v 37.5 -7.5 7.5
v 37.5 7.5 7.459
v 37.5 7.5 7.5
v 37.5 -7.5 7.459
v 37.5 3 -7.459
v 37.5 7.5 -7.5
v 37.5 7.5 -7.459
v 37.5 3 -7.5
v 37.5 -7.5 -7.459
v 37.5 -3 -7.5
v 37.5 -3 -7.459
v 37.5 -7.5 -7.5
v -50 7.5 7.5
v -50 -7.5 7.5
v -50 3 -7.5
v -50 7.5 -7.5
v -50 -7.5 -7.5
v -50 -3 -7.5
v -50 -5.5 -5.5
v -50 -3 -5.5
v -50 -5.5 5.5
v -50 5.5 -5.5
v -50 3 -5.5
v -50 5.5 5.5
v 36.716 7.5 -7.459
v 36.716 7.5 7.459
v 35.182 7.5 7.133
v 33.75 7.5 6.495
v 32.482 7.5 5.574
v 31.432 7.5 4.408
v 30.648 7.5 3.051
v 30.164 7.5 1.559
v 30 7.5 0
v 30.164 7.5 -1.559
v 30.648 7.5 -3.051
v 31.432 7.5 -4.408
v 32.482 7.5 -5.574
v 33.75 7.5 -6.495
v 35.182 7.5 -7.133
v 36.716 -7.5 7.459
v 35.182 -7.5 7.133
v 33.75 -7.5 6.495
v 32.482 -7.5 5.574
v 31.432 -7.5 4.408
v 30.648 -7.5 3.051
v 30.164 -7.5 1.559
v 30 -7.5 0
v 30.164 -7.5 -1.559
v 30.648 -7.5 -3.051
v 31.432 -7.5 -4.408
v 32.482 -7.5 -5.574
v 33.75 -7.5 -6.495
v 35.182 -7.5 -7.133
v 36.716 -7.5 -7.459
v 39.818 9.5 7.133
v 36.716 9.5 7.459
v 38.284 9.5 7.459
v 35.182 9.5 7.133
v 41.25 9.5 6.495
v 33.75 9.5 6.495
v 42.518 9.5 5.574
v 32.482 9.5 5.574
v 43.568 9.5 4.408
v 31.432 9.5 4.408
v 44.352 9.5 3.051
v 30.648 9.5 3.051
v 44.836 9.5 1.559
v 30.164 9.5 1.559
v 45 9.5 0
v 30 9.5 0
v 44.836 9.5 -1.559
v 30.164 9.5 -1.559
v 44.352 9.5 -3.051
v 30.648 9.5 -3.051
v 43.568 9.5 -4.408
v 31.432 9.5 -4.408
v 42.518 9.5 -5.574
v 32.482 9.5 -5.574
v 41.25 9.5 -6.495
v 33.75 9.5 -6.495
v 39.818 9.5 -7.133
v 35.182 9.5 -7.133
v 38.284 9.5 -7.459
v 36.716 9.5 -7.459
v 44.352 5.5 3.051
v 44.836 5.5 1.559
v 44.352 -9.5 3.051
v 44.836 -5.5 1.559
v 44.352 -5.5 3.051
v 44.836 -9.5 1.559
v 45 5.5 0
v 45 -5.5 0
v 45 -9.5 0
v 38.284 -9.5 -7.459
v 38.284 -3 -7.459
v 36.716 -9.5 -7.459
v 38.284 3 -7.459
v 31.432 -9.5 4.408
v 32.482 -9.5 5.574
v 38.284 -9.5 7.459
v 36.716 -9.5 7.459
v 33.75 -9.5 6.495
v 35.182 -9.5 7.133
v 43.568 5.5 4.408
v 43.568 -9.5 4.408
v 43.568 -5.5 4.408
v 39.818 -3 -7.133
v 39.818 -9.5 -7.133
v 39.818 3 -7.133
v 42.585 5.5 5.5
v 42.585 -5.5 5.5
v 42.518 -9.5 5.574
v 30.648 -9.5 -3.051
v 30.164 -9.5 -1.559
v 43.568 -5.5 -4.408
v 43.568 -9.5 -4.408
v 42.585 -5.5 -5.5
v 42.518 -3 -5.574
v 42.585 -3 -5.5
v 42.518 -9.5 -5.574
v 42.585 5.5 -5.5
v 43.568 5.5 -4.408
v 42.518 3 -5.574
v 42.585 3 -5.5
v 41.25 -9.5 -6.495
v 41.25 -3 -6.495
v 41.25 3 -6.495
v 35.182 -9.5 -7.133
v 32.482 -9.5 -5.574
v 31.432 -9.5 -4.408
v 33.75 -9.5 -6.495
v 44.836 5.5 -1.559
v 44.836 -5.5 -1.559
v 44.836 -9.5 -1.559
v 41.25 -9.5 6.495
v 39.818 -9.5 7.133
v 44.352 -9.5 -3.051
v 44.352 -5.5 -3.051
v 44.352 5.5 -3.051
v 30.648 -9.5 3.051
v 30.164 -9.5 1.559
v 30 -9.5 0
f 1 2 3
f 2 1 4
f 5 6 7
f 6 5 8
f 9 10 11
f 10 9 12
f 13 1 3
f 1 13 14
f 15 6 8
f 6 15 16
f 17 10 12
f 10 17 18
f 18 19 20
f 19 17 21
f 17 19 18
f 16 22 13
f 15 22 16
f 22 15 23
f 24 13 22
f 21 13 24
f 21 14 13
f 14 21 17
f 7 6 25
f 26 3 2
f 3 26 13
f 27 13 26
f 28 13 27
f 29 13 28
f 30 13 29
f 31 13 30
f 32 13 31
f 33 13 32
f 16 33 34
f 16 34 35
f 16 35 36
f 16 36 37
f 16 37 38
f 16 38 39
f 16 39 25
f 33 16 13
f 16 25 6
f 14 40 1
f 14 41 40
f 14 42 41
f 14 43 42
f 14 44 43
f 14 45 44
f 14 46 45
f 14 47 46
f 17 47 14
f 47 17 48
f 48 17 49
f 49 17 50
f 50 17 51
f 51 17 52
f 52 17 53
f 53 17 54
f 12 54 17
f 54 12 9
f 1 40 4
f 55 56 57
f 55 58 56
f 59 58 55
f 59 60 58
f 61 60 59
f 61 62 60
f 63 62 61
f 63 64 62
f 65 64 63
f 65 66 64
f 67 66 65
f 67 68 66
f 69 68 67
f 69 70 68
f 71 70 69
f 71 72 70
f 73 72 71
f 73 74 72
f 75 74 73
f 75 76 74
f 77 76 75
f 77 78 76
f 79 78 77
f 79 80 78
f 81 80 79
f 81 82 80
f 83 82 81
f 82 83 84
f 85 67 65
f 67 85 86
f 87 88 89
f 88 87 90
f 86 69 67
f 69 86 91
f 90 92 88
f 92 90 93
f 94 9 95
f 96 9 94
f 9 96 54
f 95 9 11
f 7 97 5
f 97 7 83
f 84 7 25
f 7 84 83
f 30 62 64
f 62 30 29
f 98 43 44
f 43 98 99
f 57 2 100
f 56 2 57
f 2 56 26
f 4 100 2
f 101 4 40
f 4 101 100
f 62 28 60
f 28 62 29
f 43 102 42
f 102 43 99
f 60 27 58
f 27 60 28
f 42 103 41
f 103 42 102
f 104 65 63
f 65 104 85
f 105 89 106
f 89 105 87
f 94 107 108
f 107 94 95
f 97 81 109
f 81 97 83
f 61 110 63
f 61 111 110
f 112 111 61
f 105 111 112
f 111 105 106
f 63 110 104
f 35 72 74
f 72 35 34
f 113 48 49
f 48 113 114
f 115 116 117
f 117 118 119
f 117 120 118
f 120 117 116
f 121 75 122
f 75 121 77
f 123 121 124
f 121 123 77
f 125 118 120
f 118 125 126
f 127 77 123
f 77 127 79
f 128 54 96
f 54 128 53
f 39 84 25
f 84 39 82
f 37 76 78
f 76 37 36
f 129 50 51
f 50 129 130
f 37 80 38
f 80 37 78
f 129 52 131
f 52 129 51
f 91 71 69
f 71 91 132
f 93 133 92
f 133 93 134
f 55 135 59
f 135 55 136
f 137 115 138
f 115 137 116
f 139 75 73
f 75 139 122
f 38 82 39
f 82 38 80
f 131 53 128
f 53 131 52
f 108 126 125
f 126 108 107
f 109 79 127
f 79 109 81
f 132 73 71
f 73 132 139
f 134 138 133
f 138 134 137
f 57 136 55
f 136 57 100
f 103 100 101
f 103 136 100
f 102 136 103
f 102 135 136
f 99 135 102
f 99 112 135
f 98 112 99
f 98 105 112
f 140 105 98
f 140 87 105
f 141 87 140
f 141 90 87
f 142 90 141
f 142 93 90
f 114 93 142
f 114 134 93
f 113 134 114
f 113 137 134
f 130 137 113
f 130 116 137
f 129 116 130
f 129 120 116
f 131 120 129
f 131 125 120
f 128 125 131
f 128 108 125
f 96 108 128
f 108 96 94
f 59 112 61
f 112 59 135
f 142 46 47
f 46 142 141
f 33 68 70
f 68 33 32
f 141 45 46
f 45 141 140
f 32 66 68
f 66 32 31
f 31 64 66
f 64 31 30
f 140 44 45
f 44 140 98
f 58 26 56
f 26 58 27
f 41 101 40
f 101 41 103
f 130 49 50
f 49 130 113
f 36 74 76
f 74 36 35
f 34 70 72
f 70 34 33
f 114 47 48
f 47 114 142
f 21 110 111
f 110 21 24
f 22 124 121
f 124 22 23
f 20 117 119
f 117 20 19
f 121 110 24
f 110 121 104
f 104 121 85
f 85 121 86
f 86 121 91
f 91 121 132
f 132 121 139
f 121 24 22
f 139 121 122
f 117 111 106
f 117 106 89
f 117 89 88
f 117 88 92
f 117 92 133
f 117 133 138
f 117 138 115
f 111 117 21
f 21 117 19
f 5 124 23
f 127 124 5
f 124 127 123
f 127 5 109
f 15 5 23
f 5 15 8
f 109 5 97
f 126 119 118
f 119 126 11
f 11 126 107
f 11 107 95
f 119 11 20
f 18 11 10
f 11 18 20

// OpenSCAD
$fn=30;
module bar1(){
    difference(){
        union(){
            translate([-15/4-5/2,0,0])
            cube([100-15/2-5,15,15], center=true);
            translate([100/2-15/2-5,0,0])
            rotate([90,0,0])
            cylinder(r=15/2, h=19, center=true);
        }
        length=101;
        //length=100-0.3;
        cube([length,10+1,10+1], center=true);
        translate([0,0,-5])
        cube([length,5+1,20], center=true);
    }
}
module bar2(){
    length=100/sqrt(3);
    cube([length,3,10], center=true);
    translate([length/2,0,0])
    rotate([90,0,0])
    cylinder(r=10/2, h=10, center=true);
    
    translate([-length/2,0,0])
    rotate([90,0,0])
    cylinder(r=10/2, h=3, center=true);
}

module base(){
    translate([-100/2-26/2,0,0])
    cube([26,60,2], center=true);
    
    translate([-100/2-5/2,-3/2+15,12/2+2/2])
    cube([5,3,12], center=true);
    
    translate([-100/2-5/2-16-5,-3/2+15,12/2+2/2])
    cube([5,3,12], center=true);
    
    cube([100,20,2], center=true);
    translate([100/2-15/2-5,0,15/2+1])
    difference(){
        cube([25,20,15], center=true);
        hull(){
            rotate([90,0,0])
            cylinder(r=(15+0.5)/2, h=100, center=true);
            translate([0,0,10])
            rotate([90,0,0])
            cylinder(r=(15+0.5)/2, h=100, center=true);
        }
        cube([100,15+0.5,100], center=true);
    }
}

//translate([5,0,28])
//rotate([0,30,0])
bar1();
//translate([-20,0,17])
//rotate([0,-18,0])
//bar2();
//base();
